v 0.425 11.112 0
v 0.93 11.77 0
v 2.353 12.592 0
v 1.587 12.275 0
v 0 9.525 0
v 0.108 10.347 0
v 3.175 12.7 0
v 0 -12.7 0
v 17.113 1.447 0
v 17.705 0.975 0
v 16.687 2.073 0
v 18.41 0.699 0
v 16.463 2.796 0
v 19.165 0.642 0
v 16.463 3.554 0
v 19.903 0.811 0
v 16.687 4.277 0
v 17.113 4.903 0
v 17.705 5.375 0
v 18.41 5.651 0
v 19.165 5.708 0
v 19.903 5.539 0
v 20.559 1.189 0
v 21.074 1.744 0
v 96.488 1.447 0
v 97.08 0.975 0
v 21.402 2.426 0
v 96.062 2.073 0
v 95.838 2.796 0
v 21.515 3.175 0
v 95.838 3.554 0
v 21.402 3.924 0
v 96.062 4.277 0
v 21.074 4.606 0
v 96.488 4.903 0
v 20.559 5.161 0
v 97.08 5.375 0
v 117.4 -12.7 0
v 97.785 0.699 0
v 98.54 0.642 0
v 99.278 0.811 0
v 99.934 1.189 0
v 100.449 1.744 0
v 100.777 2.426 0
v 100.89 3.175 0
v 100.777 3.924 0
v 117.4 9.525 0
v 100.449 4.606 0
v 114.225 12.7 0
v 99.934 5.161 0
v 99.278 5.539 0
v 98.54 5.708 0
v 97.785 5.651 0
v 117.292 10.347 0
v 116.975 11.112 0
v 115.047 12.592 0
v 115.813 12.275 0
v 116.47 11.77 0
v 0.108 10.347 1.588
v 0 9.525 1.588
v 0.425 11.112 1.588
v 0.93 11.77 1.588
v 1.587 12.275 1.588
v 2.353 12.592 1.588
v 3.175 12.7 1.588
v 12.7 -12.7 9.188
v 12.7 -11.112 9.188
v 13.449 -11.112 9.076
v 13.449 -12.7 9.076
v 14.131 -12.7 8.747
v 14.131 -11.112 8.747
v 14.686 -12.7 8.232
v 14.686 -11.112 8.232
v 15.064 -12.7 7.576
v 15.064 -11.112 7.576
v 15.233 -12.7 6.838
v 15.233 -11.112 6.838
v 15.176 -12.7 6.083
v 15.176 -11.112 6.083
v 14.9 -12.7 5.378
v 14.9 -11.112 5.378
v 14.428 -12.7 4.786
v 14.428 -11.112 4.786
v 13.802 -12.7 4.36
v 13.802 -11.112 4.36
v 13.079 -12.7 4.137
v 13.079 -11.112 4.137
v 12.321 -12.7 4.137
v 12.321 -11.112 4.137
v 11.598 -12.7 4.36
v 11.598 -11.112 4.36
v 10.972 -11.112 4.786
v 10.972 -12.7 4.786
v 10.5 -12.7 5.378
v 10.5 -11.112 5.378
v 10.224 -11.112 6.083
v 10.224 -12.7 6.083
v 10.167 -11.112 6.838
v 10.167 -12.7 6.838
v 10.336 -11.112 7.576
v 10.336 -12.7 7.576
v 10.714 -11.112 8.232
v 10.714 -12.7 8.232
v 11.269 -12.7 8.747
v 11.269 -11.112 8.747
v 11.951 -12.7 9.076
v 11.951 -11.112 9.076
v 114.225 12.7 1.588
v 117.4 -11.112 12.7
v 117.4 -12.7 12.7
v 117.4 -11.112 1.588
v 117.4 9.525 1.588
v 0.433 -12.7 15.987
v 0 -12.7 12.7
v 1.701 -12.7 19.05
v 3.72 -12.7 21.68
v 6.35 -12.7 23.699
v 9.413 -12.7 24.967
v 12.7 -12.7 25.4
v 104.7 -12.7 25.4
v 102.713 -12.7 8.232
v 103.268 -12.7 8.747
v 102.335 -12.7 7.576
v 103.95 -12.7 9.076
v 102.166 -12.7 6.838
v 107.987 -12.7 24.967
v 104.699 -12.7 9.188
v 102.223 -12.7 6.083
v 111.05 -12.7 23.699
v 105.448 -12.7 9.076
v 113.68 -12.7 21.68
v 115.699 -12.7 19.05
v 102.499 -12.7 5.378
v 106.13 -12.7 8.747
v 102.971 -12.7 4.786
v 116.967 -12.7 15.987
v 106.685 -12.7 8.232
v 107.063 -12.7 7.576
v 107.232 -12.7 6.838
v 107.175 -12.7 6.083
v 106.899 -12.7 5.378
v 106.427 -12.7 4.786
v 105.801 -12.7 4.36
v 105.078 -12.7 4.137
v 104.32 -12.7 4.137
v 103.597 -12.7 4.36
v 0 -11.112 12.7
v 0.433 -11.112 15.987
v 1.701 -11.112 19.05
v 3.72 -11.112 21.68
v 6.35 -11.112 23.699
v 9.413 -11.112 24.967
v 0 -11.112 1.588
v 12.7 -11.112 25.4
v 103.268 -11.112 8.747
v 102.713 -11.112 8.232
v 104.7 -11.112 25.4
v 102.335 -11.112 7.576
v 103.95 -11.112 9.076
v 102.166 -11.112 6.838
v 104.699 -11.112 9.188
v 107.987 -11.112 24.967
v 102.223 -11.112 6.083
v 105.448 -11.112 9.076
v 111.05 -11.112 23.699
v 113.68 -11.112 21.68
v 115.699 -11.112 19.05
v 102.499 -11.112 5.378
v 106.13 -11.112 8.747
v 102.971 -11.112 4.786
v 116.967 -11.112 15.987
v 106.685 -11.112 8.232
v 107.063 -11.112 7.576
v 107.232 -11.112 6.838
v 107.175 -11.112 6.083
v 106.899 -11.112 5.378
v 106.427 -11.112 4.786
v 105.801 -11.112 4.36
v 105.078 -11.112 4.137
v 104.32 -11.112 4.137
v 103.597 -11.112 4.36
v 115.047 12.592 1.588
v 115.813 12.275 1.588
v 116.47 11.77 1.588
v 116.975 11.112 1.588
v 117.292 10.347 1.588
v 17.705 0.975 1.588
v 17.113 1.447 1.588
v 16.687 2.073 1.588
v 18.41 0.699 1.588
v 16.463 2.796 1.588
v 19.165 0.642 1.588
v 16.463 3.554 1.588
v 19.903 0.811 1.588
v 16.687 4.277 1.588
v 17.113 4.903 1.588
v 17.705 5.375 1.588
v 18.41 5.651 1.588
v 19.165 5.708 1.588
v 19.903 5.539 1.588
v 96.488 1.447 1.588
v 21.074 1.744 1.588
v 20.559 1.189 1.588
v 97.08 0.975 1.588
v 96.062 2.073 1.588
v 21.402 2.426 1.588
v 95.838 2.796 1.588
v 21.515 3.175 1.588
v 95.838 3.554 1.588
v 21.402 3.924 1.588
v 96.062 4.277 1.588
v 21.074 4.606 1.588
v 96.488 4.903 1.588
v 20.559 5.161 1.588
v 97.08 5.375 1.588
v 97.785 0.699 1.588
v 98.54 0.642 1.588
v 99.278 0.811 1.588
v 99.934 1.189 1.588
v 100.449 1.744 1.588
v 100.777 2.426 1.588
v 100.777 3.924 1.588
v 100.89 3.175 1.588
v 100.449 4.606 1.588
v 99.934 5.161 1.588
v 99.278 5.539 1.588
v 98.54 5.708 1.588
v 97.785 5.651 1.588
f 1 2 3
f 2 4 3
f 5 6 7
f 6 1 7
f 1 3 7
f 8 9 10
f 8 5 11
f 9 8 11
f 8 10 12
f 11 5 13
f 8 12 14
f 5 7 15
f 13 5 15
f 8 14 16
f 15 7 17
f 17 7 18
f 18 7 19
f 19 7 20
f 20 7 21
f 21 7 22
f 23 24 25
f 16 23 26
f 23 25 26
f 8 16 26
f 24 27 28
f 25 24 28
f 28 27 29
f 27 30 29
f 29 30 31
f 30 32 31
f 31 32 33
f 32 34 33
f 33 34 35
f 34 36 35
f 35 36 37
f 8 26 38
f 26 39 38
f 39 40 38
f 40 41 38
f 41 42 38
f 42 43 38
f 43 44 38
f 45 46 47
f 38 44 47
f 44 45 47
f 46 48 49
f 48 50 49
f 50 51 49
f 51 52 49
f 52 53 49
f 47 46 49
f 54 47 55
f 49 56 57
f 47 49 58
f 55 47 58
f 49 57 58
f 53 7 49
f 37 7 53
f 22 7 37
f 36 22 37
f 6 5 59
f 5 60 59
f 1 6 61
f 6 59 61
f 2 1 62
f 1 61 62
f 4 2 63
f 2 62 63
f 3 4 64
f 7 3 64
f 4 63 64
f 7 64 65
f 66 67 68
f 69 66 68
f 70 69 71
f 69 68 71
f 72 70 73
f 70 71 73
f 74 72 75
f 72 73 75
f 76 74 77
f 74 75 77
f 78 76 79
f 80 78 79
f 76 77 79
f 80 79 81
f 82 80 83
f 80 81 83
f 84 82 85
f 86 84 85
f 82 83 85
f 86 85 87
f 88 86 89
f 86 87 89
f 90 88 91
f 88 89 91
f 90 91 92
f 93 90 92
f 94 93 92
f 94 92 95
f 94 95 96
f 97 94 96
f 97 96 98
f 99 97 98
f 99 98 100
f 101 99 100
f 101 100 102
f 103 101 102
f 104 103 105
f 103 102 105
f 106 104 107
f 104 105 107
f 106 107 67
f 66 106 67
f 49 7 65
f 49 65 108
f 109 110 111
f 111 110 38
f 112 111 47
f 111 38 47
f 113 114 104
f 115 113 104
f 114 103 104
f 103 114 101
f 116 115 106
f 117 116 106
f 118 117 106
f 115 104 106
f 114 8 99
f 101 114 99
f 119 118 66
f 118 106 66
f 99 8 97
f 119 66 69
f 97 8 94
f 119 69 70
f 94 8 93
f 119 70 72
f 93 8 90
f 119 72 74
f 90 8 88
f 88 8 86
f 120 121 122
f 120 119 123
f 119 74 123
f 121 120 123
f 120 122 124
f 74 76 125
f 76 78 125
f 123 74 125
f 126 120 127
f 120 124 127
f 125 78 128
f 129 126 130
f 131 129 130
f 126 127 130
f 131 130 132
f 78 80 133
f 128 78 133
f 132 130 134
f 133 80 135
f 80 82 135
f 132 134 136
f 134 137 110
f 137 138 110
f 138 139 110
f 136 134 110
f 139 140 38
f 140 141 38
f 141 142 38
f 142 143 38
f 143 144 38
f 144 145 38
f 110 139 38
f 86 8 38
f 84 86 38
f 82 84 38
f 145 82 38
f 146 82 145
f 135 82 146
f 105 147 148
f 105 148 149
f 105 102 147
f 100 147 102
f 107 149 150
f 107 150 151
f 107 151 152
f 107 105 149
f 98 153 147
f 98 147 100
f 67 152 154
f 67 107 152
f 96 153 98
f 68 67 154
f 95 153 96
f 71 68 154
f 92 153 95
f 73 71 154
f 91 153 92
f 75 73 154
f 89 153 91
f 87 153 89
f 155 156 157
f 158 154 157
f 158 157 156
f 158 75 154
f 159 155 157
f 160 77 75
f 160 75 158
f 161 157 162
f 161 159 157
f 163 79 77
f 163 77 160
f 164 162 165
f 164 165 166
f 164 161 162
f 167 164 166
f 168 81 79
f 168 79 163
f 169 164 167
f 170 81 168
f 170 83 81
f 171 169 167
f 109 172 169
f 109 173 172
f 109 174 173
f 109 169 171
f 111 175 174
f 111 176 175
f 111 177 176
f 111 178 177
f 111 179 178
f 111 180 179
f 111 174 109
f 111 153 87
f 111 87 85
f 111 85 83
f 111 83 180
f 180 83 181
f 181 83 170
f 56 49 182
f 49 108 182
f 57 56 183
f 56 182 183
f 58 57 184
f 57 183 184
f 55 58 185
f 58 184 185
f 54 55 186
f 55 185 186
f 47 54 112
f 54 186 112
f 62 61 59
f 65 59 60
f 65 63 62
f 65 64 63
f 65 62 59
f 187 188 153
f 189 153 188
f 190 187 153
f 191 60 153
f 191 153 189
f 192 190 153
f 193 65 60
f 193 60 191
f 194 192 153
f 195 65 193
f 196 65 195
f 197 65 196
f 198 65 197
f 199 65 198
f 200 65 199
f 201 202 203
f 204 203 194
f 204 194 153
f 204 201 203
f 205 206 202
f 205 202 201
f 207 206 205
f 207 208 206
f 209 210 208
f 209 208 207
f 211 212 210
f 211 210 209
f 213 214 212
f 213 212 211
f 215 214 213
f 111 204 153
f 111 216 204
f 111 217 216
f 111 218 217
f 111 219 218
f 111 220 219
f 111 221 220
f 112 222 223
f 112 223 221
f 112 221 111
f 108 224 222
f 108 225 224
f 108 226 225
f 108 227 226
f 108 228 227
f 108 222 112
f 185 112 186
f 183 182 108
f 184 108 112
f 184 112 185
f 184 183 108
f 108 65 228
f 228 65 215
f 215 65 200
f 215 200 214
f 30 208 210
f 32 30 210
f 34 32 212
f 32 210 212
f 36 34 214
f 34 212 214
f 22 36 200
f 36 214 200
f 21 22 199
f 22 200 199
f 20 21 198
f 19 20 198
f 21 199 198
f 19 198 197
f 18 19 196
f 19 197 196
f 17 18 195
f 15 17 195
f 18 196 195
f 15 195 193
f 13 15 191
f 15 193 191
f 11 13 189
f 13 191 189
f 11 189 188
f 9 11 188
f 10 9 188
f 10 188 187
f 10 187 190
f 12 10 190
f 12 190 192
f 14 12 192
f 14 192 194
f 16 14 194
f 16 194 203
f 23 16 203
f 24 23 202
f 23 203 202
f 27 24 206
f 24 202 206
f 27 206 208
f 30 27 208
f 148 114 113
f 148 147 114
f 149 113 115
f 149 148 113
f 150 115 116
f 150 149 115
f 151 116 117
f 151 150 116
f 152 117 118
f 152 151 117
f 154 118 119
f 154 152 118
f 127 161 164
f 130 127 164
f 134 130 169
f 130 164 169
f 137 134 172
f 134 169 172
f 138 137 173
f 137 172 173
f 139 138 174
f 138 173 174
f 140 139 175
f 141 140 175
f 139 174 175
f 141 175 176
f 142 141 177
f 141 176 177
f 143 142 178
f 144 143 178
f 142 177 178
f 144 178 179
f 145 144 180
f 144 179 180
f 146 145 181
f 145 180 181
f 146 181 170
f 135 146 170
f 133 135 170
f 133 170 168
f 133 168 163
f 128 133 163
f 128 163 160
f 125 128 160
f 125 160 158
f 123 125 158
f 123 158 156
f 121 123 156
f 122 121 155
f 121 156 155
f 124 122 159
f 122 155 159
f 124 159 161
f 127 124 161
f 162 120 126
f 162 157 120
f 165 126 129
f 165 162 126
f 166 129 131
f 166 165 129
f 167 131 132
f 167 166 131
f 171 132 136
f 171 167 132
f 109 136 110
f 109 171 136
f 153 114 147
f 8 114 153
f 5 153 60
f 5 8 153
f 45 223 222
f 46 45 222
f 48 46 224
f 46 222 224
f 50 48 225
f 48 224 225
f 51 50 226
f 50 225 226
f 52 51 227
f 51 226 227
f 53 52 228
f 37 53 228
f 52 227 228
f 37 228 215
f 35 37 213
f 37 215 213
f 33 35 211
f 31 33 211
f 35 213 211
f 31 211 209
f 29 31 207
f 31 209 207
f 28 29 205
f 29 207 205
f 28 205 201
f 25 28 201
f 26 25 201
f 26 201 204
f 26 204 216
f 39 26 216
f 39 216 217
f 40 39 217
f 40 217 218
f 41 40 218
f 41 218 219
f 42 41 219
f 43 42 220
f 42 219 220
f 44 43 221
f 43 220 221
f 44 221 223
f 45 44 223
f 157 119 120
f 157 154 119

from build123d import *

# Parameters (mm, degrees)
SKETCH1_W           = 117.4
SKETCH1_H           = 25.4
BOSS_EXTRUDE1_DEPTH = 1.5875
SKETCH2_W           = 117.4
SKETCH2_H           = 1.5875
BOSS_EXTRUDE2_DEPTH = 23.8125
SKETCH3_R           = 2.54
CUT_EXTRUDE1_DEPTH  = 1.5875
SKETCH4_R           = 2.54
CUT_EXTRUDE2_DEPTH  = 1.5875
FILLET1_R           = 12.7
FILLET2_R           = 3.175


with BuildPart() as part:
    # Sketch1 → Boss-Extrude1 (new body)
    with BuildSketch(Plane.XY):
        with Locations((58.7, 0)):
            Rectangle(SKETCH1_W, SKETCH1_H)
    extrude(amount=BOSS_EXTRUDE1_DEPTH)

    # Sketch2 → Boss-Extrude2 (add)
    with BuildSketch(Plane.XY.offset(1.5875)):
        with Locations((58.7, -11.90625)):
            Rectangle(SKETCH2_W, SKETCH2_H)
    extrude(amount=BOSS_EXTRUDE2_DEPTH)

    # Sketch3 → Cut-Extrude1 (cut)
    with BuildSketch(Plane(origin=(0, -11.1125, 0), x_dir=(1, 0, 0), z_dir=(0, 1, 0))):
        with Locations(Location((12.7, -6.64845, 0), (0, 0, 270))):
            Circle(SKETCH3_R)
        with Locations(Location((104.6990032, -6.64845, 0), (0, 0, 270))):
            Circle(SKETCH3_R)
    extrude(amount=-CUT_EXTRUDE1_DEPTH, mode=Mode.SUBTRACT)

    # Sketch4 → Cut-Extrude2 (cut)
    with BuildSketch(Plane.XY.offset(1.5875)):
        with Locations((18.975, 3.175)):
            Circle(SKETCH4_R)
        with Locations((98.35, 3.175)):
            Circle(SKETCH4_R)
    extrude(amount=-CUT_EXTRUDE2_DEPTH, mode=Mode.SUBTRACT)

    # Fillet1
    fillet1_edges = [part.edges().sort_by_distance(p)[0] for p in [
        (0, -11.90625, 25.4),
        (117.4, -11.90625, 25.4),
    ]]
    fillet(fillet1_edges, radius=FILLET1_R)

    # Fillet2
    fillet2_edges = [part.edges().sort_by_distance(p)[0] for p in [
        (0, 12.7, 0.79375),
        (117.4, 12.7, 0.79375),
    ]]
    fillet(fillet2_edges, radius=FILLET2_R)


solid = part.part
